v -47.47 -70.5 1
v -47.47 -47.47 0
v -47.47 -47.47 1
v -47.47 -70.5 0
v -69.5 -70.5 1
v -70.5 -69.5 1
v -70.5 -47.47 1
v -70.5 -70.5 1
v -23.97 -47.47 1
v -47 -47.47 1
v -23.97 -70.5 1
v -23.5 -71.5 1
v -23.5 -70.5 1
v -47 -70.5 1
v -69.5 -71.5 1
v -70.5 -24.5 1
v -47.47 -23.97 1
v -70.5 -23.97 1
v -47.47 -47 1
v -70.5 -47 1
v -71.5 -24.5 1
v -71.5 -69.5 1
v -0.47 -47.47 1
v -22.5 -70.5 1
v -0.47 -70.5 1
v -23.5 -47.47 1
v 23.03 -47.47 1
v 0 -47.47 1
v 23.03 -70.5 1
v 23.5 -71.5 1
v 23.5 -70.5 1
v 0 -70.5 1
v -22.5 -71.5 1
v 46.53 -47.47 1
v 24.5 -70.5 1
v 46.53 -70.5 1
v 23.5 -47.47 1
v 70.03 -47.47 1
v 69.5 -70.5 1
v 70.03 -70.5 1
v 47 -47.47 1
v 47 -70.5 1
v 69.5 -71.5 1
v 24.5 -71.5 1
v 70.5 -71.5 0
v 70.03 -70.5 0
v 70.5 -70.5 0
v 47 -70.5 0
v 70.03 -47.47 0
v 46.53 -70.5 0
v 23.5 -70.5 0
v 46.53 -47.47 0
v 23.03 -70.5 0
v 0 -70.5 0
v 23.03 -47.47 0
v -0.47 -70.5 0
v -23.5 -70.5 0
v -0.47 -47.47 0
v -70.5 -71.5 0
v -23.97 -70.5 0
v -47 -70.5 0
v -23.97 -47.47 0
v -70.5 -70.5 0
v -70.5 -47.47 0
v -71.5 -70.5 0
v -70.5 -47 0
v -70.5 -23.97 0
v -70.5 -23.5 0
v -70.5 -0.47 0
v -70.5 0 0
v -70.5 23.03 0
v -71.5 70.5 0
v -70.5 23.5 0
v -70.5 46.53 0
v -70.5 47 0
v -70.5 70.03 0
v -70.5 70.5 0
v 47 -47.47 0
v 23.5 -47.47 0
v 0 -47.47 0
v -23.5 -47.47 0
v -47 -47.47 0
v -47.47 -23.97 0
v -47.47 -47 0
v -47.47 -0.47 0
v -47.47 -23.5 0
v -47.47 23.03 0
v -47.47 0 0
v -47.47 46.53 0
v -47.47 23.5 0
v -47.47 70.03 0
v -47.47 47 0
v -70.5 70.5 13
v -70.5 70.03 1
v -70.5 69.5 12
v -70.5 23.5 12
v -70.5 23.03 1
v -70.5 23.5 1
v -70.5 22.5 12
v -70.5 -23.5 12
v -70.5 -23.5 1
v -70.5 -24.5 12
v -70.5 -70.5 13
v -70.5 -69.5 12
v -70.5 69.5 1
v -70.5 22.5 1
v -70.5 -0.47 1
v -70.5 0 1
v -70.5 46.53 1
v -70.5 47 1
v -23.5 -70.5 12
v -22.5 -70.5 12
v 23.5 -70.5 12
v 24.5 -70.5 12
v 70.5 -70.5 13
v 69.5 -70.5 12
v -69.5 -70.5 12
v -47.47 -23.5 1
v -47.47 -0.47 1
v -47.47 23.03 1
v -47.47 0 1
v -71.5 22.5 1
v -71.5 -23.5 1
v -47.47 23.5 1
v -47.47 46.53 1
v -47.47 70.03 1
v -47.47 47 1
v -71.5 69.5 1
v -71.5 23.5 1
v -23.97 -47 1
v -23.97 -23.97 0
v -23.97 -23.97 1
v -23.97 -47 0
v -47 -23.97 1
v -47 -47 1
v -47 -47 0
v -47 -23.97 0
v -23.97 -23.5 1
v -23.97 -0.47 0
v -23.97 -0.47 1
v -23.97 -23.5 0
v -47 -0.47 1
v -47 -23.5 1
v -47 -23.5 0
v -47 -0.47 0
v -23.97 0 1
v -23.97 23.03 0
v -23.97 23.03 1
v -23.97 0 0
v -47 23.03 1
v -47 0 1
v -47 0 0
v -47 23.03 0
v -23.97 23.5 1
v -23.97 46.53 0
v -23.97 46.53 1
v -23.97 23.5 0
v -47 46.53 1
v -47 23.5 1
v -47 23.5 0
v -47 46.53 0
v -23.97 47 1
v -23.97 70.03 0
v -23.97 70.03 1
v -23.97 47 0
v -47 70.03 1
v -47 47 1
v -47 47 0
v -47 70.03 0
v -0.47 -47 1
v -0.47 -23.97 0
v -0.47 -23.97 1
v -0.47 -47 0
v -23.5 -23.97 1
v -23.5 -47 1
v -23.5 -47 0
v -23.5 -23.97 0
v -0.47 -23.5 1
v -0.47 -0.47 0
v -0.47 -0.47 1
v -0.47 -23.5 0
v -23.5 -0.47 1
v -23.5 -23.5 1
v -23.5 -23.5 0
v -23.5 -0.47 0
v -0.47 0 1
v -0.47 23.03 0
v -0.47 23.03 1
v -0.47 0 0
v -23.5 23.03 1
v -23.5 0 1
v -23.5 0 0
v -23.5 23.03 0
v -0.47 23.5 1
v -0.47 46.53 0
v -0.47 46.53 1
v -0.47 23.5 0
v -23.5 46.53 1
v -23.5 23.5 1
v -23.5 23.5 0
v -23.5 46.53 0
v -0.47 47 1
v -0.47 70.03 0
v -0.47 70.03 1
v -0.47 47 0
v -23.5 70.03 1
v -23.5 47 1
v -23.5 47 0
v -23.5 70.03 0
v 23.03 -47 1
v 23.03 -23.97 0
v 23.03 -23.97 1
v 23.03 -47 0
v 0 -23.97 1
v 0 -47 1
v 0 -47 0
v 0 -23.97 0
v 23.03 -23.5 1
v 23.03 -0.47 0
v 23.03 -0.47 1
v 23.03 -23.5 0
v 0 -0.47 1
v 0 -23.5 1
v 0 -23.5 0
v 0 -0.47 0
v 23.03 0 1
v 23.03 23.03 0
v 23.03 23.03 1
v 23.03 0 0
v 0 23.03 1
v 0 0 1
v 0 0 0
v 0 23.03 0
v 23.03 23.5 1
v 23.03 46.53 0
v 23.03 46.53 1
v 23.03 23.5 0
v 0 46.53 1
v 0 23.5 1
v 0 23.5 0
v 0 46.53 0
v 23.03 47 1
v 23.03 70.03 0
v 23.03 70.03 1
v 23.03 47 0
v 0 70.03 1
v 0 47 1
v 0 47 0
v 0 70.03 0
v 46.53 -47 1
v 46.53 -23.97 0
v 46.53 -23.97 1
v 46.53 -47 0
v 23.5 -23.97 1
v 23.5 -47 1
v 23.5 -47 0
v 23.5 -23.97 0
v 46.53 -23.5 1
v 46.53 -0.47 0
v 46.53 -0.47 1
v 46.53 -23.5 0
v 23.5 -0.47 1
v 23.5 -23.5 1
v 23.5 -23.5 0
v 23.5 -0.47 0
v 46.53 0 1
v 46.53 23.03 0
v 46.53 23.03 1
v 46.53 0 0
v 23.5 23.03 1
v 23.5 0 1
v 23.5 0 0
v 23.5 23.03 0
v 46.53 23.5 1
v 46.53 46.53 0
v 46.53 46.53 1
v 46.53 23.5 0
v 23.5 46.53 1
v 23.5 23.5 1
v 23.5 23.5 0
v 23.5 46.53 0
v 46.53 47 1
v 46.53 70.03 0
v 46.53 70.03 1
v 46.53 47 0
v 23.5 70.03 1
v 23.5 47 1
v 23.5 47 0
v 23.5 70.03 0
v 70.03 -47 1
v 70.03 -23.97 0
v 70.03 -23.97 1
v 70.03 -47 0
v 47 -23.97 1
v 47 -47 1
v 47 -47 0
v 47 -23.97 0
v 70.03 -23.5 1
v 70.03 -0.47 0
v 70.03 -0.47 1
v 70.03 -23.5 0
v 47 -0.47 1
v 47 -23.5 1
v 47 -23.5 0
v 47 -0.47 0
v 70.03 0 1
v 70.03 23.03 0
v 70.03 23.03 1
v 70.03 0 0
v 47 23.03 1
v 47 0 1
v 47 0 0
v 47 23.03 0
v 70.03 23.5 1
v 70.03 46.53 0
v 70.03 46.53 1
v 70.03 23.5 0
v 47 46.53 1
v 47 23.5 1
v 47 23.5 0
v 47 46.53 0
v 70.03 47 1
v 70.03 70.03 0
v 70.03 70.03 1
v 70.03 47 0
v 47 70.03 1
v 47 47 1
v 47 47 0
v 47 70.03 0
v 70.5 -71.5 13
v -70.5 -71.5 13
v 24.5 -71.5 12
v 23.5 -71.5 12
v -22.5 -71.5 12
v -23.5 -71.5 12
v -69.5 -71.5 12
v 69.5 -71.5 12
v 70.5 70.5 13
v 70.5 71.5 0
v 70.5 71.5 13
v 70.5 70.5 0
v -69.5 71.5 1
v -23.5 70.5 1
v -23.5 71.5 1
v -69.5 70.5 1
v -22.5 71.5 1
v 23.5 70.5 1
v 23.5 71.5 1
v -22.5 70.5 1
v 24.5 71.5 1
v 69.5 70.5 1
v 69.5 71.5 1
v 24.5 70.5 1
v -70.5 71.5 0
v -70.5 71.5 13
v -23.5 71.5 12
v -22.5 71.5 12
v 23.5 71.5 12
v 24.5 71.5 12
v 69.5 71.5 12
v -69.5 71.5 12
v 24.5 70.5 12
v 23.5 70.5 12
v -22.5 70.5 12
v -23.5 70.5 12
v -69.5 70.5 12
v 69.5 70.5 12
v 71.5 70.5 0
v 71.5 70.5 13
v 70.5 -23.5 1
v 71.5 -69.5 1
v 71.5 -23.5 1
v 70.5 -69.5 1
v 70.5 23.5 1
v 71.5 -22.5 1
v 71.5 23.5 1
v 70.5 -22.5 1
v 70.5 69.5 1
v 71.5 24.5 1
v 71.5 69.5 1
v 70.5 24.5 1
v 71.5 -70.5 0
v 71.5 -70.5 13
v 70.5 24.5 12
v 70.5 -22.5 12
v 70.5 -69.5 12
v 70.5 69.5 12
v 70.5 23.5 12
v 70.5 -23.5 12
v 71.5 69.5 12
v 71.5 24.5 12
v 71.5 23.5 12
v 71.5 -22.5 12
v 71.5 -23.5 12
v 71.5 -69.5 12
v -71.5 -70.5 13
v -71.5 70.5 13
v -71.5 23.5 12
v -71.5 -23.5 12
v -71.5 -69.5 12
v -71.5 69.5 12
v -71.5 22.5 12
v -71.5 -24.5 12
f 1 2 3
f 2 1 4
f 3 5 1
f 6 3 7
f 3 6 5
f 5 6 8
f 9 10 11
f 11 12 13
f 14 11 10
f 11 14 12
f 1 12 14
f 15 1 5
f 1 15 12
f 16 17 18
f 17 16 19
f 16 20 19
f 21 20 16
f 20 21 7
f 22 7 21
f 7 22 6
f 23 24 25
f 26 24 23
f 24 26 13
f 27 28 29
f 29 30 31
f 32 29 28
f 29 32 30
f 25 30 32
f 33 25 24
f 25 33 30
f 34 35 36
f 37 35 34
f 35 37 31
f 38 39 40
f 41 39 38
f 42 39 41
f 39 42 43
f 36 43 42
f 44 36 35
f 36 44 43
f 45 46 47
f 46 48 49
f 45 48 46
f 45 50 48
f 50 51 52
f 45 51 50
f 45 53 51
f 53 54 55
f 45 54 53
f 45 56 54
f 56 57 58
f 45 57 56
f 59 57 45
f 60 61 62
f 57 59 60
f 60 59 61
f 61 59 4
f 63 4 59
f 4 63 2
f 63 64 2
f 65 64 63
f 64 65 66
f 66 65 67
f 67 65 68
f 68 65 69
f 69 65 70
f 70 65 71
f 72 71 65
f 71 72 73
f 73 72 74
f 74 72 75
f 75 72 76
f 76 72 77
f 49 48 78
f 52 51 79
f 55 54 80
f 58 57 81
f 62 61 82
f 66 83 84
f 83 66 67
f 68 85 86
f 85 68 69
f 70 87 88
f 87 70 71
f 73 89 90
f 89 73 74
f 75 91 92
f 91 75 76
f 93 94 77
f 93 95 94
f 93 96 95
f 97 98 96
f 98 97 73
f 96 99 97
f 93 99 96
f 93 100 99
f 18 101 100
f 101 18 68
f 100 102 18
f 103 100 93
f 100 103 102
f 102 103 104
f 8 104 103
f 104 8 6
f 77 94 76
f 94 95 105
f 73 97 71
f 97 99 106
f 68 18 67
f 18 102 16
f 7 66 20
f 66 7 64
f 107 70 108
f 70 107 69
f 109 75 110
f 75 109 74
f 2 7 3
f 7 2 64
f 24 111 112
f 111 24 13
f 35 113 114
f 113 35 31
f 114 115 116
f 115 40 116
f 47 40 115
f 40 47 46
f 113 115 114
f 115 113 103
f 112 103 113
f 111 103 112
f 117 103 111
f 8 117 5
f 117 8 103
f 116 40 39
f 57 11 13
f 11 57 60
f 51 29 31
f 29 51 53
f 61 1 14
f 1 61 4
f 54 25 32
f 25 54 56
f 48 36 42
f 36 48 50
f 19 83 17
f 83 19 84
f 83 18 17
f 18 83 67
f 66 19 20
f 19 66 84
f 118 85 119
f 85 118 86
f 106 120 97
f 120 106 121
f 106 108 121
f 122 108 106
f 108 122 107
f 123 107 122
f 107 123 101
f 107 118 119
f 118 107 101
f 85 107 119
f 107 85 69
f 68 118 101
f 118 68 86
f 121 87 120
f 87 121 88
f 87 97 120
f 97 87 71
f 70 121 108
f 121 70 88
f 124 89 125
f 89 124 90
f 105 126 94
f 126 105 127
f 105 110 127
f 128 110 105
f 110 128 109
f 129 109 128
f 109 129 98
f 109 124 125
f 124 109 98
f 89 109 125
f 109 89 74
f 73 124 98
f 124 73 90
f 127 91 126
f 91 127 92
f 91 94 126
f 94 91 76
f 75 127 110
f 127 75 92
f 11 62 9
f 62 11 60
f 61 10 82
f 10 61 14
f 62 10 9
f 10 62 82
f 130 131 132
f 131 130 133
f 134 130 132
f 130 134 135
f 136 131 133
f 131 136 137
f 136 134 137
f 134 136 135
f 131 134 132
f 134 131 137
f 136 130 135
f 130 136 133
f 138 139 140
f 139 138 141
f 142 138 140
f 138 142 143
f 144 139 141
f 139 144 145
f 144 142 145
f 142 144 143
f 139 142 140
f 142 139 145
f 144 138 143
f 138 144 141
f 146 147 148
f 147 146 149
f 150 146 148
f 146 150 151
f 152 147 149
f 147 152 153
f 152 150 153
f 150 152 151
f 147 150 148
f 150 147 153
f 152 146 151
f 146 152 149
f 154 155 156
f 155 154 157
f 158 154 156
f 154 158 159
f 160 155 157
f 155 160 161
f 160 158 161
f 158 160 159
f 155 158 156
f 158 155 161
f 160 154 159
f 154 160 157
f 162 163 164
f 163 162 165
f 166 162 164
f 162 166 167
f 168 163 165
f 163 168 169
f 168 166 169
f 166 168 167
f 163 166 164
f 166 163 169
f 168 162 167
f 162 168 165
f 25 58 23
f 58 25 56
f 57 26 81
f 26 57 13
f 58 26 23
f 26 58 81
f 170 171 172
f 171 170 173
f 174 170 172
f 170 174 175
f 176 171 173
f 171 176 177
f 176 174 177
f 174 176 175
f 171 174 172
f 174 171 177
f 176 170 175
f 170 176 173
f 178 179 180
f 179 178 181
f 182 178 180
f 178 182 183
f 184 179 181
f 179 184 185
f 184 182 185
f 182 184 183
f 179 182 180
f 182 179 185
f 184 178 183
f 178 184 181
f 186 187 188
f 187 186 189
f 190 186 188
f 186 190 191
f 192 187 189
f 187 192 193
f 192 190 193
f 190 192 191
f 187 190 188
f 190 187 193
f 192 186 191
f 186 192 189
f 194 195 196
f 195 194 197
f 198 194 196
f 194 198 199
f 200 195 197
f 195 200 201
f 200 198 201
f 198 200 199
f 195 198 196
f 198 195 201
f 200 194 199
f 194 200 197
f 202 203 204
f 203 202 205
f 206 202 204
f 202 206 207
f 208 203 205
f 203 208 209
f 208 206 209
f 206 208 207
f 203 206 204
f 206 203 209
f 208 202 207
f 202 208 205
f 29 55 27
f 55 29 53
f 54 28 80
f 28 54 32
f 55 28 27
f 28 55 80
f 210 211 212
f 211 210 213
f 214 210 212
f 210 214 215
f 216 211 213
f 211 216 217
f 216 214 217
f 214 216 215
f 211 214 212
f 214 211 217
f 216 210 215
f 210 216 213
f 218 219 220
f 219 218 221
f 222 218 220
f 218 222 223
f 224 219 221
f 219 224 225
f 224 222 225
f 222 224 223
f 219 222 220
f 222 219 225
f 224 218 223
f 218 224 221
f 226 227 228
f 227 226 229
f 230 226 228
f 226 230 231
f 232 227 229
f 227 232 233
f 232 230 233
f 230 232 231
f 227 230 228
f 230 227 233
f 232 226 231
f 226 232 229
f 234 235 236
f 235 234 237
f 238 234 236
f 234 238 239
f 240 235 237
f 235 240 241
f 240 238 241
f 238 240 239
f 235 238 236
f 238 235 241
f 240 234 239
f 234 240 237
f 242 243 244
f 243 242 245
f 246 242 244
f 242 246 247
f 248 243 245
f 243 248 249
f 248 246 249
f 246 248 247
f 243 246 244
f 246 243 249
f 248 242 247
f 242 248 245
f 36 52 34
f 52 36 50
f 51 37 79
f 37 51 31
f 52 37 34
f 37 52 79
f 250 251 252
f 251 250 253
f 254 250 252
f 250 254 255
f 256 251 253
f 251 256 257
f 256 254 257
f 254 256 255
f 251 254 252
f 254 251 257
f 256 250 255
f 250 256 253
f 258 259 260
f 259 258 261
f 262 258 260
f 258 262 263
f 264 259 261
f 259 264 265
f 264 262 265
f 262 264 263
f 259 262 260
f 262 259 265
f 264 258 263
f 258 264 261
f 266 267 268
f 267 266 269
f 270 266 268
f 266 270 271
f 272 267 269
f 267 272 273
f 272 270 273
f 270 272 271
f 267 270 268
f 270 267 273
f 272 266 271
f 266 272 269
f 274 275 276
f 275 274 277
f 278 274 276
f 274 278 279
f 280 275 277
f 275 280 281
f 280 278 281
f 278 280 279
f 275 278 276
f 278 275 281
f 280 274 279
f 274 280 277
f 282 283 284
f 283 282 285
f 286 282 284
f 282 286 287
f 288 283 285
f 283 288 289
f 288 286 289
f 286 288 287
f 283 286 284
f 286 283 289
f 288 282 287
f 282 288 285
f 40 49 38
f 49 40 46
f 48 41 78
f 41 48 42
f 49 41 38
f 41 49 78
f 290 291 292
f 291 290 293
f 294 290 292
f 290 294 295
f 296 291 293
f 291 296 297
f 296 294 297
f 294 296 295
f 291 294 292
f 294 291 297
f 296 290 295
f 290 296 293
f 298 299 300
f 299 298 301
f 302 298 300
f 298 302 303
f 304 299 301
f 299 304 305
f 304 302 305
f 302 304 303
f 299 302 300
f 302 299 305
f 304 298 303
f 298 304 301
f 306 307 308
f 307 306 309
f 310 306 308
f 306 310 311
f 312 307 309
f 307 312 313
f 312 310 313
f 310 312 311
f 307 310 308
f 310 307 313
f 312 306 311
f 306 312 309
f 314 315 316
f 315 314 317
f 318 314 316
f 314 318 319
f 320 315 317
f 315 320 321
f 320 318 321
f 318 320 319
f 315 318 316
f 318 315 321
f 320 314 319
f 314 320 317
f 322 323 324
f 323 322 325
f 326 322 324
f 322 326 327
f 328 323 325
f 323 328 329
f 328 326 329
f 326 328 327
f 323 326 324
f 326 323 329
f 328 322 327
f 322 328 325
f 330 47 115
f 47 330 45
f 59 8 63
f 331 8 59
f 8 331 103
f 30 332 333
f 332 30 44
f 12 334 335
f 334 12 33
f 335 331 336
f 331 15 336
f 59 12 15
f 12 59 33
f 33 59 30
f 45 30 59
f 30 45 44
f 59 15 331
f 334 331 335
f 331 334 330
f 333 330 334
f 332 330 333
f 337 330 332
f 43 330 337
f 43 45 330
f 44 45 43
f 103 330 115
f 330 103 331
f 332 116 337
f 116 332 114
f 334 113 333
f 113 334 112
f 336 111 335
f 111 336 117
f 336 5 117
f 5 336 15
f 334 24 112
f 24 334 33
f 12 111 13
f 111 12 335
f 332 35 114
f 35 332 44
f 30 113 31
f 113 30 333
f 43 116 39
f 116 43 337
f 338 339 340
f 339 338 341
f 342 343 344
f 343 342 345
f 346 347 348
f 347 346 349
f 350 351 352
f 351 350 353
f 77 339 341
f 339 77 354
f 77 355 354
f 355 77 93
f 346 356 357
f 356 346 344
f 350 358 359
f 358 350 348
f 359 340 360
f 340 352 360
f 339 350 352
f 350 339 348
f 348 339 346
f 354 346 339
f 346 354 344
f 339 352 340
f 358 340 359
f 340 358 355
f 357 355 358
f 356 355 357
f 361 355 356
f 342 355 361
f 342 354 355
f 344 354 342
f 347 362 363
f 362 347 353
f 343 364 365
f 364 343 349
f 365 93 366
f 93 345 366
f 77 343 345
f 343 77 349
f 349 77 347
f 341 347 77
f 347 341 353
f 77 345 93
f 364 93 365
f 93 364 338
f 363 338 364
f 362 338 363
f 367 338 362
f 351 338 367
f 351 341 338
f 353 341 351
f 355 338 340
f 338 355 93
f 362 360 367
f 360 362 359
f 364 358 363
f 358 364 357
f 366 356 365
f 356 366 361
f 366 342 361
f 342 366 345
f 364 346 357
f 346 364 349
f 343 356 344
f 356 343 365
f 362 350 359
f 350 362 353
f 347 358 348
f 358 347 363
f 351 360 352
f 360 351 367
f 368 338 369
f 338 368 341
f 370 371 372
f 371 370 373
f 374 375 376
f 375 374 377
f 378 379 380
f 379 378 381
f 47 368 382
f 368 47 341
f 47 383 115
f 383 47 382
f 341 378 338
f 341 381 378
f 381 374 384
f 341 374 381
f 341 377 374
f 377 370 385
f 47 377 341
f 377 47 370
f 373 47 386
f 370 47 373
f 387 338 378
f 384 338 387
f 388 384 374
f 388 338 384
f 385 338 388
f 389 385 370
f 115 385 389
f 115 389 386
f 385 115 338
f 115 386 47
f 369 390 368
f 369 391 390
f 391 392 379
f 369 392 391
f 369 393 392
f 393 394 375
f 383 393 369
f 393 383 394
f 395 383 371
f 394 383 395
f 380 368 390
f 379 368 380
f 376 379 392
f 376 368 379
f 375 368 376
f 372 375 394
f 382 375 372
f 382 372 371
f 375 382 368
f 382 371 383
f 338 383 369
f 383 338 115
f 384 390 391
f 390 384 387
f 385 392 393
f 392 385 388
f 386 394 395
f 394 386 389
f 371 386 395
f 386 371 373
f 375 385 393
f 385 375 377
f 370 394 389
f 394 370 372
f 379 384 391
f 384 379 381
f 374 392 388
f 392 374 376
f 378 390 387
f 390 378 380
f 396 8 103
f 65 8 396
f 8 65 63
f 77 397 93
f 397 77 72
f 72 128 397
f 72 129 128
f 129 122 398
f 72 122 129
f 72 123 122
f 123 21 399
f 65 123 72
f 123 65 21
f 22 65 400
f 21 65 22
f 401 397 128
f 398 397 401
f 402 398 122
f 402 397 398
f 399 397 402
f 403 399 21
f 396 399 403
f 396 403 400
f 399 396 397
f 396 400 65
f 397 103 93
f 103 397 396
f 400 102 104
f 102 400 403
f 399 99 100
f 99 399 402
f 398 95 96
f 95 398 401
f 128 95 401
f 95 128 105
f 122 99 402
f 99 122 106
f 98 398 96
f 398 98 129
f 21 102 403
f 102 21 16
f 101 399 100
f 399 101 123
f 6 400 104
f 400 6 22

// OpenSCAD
// file: Parameters.scad
// Parameters common to all FIRST robots

FIELD_WIDTH      = 141;  // inches
TILE_WIDTH       = FIELD_WIDTH/6;
//echo(TILE_WIDTH=TILE_WIDTH);
TILE_HEIGHT      = 1;
FIELD_SCALE      = .98;

TAPE_HEIGHT      = 0.01;

WALL_FRAME_WIDTH = 1;
WALL_HEIGHT      = 12;
// main file
include<Parameters.scad>

// Render an empty field

module tile() {
    color("grey") cube([TILE_WIDTH,TILE_WIDTH,TILE_HEIGHT],center=false);
}

module field_tiles() {
    for (i=[-3:1:2]) {
        for (j=[-3:1:2]) {
            translate([i*TILE_WIDTH,j*TILE_WIDTH,0])
                scale([FIELD_SCALE,FIELD_SCALE,1]) tile();
        }
    }
}

module field_wall() {

    WALL_COLOR = "black";

    color(WALL_COLOR) {
        translate([-FIELD_WIDTH/2,-FIELD_WIDTH/2-1,0]) 
            cube([FIELD_WIDTH,WALL_FRAME_WIDTH,WALL_FRAME_WIDTH],center=false);

        translate([-FIELD_WIDTH/2,-FIELD_WIDTH/2-1,WALL_HEIGHT]) 
            cube([FIELD_WIDTH,WALL_FRAME_WIDTH,WALL_FRAME_WIDTH],center=false);

        translate([-FIELD_WIDTH/2,-FIELD_WIDTH/2-1,0]) 
            cube([WALL_FRAME_WIDTH,WALL_FRAME_WIDTH,WALL_HEIGHT],center=false);

        translate([-FIELD_WIDTH/6,-FIELD_WIDTH/2-1,0]) 
            cube([WALL_FRAME_WIDTH,WALL_FRAME_WIDTH,WALL_HEIGHT],center=false);

        translate([FIELD_WIDTH/6,-FIELD_WIDTH/2-1,0]) 
            cube([WALL_FRAME_WIDTH,WALL_FRAME_WIDTH,WALL_HEIGHT],center=false);

        translate([FIELD_WIDTH/2-WALL_FRAME_WIDTH,-FIELD_WIDTH/2-1,0]) 
            cube([WALL_FRAME_WIDTH,WALL_FRAME_WIDTH,WALL_HEIGHT],center=false);
        }
}

module BuildField() {

    field_tiles();

    field_wall();

    translate( [0, FIELD_WIDTH+WALL_FRAME_WIDTH, 0]) field_wall();

    translate( [0, 0, 0])  rotate([0, 0, 90]) field_wall();
    
    translate( [0, 0, 0])  rotate([0, 0, -90]) field_wall();


}
BuildField();
translate([70.5,70.5,0]) circle(r=2,$fn=20);  // size check
translate([-70.5,-70.5,0]) circle(r=2,$fn=20);  // size check
